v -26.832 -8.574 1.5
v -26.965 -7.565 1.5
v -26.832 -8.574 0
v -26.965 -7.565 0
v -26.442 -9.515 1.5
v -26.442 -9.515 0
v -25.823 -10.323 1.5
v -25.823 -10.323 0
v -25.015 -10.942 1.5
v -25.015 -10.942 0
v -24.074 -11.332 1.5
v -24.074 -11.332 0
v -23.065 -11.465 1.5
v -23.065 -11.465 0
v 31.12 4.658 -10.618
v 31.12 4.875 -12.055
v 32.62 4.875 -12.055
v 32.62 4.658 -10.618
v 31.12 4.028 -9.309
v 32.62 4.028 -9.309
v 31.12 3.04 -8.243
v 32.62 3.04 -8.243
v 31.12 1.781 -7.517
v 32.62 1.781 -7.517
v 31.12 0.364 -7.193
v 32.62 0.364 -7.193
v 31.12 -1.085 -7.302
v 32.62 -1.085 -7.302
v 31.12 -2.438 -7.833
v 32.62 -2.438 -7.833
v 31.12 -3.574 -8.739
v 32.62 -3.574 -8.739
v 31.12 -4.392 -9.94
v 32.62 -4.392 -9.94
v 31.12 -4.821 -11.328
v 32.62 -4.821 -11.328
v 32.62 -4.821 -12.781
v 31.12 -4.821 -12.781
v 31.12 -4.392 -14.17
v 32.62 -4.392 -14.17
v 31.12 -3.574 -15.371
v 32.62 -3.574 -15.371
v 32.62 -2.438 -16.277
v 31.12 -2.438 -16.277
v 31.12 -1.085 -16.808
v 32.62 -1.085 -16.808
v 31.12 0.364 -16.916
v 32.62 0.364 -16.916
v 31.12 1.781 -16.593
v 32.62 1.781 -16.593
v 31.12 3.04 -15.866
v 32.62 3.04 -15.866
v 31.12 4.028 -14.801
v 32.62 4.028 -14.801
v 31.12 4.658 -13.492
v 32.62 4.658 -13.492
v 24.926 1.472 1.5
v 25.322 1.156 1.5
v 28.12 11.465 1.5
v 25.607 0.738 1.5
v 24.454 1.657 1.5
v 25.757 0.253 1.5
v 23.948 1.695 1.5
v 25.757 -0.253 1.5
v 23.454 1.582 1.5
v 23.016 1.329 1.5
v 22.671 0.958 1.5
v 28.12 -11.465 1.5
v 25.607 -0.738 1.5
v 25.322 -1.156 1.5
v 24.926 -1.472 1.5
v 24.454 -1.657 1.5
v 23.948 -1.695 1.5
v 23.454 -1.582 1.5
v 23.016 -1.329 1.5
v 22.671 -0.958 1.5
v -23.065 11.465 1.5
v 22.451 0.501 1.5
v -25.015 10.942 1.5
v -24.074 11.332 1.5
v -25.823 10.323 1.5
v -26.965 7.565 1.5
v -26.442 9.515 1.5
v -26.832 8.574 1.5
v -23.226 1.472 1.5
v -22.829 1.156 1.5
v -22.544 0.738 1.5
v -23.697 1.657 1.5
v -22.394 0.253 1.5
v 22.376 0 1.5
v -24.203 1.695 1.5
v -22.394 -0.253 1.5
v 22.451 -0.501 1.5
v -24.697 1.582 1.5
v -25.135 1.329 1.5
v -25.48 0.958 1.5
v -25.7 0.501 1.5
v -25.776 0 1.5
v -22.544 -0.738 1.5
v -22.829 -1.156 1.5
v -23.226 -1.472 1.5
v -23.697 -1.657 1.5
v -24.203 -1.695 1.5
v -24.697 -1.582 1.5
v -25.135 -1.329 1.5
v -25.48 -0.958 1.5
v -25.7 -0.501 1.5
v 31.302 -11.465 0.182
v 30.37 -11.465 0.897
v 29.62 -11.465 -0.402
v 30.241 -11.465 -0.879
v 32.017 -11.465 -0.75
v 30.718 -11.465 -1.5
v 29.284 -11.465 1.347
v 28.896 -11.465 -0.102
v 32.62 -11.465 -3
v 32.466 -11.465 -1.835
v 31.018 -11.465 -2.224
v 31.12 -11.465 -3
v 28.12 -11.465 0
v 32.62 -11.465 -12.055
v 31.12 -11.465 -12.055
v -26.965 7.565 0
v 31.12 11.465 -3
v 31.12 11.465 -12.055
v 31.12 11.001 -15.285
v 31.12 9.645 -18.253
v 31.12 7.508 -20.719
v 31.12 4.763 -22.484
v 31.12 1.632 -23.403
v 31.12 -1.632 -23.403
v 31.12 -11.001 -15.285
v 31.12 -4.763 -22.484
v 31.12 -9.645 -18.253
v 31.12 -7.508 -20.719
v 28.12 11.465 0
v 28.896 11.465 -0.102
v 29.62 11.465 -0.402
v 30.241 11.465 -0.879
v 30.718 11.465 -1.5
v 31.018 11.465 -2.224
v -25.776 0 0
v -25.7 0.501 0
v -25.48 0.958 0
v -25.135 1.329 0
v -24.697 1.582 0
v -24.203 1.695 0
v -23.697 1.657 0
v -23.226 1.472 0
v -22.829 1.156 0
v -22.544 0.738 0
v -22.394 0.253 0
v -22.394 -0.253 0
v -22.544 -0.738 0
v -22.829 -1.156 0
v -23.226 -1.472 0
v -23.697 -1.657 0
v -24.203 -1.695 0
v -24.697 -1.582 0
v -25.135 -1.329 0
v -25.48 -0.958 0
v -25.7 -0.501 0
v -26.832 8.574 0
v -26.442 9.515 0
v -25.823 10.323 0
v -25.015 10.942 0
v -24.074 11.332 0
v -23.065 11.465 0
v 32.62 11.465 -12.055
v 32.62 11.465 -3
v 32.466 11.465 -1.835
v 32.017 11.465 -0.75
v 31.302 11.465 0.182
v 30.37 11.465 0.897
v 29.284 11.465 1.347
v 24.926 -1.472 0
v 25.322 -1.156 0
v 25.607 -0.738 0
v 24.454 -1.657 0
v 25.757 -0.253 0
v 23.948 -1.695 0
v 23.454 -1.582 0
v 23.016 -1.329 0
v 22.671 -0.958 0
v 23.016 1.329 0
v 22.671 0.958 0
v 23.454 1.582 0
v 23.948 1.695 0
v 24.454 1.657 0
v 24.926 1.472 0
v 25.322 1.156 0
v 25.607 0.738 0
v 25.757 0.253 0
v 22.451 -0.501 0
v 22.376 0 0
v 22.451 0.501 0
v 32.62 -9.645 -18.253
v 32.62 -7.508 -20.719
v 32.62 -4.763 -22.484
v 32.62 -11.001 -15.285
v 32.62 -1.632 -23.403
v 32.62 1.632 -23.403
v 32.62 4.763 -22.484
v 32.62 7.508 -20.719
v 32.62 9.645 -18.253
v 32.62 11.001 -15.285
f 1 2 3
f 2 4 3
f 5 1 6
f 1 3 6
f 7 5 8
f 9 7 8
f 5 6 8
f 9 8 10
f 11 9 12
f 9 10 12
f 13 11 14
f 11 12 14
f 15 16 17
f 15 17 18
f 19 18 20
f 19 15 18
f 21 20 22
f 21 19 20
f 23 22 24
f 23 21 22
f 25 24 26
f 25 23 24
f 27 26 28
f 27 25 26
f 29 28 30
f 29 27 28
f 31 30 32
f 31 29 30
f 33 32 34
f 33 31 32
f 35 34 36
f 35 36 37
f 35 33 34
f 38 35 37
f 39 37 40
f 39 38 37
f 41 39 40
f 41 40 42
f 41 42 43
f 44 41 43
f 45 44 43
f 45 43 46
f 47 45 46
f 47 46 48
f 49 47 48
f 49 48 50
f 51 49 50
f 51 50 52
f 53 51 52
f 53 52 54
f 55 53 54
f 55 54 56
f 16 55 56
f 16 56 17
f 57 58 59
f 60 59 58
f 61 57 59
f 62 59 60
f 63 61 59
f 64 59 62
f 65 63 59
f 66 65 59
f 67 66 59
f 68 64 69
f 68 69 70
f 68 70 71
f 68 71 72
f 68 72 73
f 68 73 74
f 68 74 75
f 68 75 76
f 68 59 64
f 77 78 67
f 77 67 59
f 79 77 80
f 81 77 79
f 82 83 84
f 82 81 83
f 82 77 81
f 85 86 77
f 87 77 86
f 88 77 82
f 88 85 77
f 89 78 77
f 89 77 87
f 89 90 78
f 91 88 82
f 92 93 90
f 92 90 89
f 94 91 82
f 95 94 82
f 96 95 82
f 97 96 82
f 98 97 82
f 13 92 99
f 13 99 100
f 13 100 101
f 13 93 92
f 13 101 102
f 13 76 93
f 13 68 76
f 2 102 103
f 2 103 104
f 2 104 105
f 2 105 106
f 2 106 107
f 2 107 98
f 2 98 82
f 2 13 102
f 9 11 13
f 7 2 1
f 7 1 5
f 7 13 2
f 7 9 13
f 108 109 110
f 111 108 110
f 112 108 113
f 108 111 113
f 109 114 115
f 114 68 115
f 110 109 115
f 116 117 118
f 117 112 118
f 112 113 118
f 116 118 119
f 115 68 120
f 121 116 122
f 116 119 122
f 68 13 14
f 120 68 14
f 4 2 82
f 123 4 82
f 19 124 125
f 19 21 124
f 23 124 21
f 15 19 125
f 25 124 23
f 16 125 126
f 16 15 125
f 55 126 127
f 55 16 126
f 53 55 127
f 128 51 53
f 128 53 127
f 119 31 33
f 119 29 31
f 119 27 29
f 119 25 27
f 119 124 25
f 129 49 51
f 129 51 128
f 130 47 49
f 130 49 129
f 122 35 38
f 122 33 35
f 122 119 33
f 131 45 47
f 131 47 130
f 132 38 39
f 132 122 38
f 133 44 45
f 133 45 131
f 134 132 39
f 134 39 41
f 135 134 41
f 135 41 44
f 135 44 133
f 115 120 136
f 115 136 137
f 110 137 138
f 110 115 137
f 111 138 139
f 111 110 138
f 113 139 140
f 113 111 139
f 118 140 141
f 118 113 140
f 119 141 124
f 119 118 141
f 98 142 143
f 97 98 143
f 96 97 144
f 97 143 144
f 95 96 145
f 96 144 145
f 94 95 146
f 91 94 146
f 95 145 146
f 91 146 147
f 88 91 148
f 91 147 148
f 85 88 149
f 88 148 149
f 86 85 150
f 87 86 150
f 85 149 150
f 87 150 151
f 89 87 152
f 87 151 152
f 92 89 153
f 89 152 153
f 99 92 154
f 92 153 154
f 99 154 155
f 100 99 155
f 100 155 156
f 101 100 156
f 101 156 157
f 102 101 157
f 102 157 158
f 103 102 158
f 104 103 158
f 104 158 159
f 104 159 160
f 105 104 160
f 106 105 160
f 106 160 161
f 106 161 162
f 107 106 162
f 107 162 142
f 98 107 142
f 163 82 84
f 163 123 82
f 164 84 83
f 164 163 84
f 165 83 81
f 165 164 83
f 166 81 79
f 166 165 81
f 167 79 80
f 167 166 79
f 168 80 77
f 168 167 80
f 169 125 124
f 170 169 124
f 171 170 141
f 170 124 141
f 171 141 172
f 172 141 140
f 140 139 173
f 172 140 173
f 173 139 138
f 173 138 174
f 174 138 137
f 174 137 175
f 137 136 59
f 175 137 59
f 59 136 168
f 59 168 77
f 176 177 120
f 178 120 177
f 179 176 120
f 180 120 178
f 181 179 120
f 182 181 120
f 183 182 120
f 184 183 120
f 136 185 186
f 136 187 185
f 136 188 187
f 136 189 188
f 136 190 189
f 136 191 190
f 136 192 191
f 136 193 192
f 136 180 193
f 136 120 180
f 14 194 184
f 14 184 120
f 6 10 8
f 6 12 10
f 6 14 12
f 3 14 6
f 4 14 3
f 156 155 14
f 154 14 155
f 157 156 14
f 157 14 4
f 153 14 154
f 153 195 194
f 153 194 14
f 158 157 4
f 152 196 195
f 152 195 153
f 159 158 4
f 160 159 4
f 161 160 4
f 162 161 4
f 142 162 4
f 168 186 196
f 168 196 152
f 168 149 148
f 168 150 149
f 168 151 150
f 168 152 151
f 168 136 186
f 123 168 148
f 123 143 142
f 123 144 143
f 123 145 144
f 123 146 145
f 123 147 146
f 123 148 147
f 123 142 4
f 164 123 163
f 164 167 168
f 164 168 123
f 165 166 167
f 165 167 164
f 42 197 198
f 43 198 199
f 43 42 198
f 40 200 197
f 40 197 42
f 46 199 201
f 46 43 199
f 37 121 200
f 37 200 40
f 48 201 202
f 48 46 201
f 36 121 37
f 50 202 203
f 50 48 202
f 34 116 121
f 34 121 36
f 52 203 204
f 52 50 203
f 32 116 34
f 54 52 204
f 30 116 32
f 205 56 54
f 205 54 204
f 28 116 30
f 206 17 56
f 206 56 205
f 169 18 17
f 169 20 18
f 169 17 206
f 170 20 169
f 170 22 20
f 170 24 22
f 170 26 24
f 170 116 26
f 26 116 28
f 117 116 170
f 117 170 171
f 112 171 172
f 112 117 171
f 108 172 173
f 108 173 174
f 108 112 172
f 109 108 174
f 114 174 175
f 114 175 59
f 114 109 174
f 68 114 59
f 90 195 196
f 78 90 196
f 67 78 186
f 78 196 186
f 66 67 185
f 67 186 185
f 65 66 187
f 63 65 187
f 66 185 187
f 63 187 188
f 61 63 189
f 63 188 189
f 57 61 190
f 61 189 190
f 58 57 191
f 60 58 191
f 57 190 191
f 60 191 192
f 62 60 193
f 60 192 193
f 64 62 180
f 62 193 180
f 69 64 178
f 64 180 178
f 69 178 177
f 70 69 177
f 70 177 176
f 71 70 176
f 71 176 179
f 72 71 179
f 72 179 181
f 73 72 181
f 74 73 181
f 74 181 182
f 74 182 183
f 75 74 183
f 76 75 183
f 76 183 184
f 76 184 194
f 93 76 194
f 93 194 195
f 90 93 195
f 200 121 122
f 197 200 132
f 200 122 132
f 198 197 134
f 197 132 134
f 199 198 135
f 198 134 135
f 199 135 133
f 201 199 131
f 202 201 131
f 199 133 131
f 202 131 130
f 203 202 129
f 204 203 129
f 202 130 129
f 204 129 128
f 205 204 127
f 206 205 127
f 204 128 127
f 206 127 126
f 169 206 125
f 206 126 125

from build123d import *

# Parameters (mm, degrees)
SKETCH1_W                  = 53.93
SKETCH1_H                  = 22.93
BOSS_EXTRUDE1_DEPTH        = 1.5
M3_CLEARANCE_HOLE1_D       = 3.4
M3_CLEARANCE_HOLE1_DEPTH   = 27
M3_CLEARANCE_HOLE1_TIP     = 1.021463052
FILLET1_R                  = 3.9
BOSS_EXTRUDE2_START        = -1.5
SKETCH4_R                  = 4.875
BOSS_EXTRUDE2_DEPTH        = 1.5
SKETCHED_START             = 32.144466887
SKETCHED_BEND1_OUTLINE_W   = 22.93
SKETCHED_BEND1_OUTLINE_H   = 1.5
SKETCHED_BEND1_DEPTH       = 23.855533113
SKETCHED_START_2           = 28.119756887
SKETCHED_BEND1_2_OUTLINE_R = 4.875
SKETCHED_BEND1_2_DEPTH     = 4.5
SKETCHED_START_3           = -11.465
SKETCHED_BEND1_3_DEPTH     = 22.93


with BuildPart() as part:
    # Sketch1 → Boss-Extrude1 (new body)
    with BuildSketch(Plane.XY.offset(1.5)):
        Rectangle(SKETCH1_W, SKETCH1_H)
    extrude(amount=-BOSS_EXTRUDE1_DEPTH)

    # M3 Clearance Hole1
    with Locations(Plane.XY.offset(1.5)):
        with Locations((-24.0755, 0), (24.0755, 0)):
            Hole(M3_CLEARANCE_HOLE1_D / 2, depth=M3_CLEARANCE_HOLE1_DEPTH)
            with Locations((0, 0, -(M3_CLEARANCE_HOLE1_DEPTH + M3_CLEARANCE_HOLE1_TIP / 2))):  # 118° drill point
                Cone(0, M3_CLEARANCE_HOLE1_D / 2, M3_CLEARANCE_HOLE1_TIP, mode=Mode.SUBTRACT)

    # Fillet1
    fillet1_edges = [part.edges().sort_by_distance(p)[0] for p in [
        (-26.965, -11.465, 0.75),
        (-26.965, 11.465, 0.75),
        (26.965, 11.465, 0.75),
        (26.965, -11.465, 0.75),
    ]]
    fillet(fillet1_edges, radius=FILLET1_R)

    # Sketch4 → Boss-Extrude2 (add)
    with BuildSketch(Plane.XY.offset(1.5).offset(BOSS_EXTRUDE2_START)):
        with BuildLine():
            Line((23.065, 11.465), (43.065, 11.465))
            ThreePointArc((43.065, 11.465), (54.53, 0), (43.065, -11.465))
            Line((43.065, -11.465), (23.065, -11.465))
            ThreePointArc((23.065, -11.465), (25.822716447, -10.322716447), (26.965, -7.565))
            Line((26.965, -7.565), (26.965, 7.565))
            ThreePointArc((26.965, 7.565), (25.822716447, 10.322716447), (23.065, 11.465))
        make_face()
        with Locations((43.065, 0)):
            Circle(SKETCH4_R, mode=Mode.SUBTRACT)
    extrude(amount=BOSS_EXTRUDE2_DEPTH)

    # Sketched Bend1: read off the stored shape, not the designer's step
    # Sketched Bend1 outline → Sketched Bend1 (cut)
    with BuildSketch(Plane.YZ.offset(SKETCHED_START)):
        with Locations((0, 0.75)):
            Rectangle(SKETCHED_BEND1_OUTLINE_W, SKETCHED_BEND1_OUTLINE_H)
    extrude(amount=SKETCHED_BEND1_DEPTH, mode=Mode.SUBTRACT)

    # Sketched Bend1 2 outline → Sketched Bend1 2 (add)
    with BuildSketch(Plane.YZ.offset(SKETCHED_START_2)):
        with BuildLine():
            Line((-11.465, 0), (-11.465, -12.054756887))
            ThreePointArc((-11.465, -12.054756887), (0, -23.519756887), (11.465, -12.054756887))
            Line((11.465, -12.054756887), (11.465, 0))
            Line((11.465, 0), (-11.465, 0))
        make_face()
        with Locations((0, -12.054756887)):
            Circle(SKETCHED_BEND1_2_OUTLINE_R, mode=Mode.SUBTRACT)
    extrude(amount=SKETCHED_BEND1_2_DEPTH)

    # Sketched Bend1 3 outline → Sketched Bend1 3 (cut)
    with BuildSketch(Plane(origin=(0, 0, 0), x_dir=(1, 0, 0), z_dir=(0, 1, 0)).offset(SKETCHED_START_3)):
        with BuildLine():
            ThreePointArc((28.119756887, 0), (30.241077231, 0.878679656), (31.119756887, 3))
            Line((31.119756887, 3), (31.119756887, 25))
            Line((31.119756887, 25), (28.119756887, 25))
            Line((28.119756887, 25), (28.119756887, 0))
        make_face()
        with BuildLine():
            Line((32.619756887, 0), (32.619756887, 3))
            ThreePointArc((32.619756887, 3), (31.301737402, -0.181980515), (28.119756887, -1.5))
            Line((28.119756887, -1.5), (27, -1.5))
            Line((27, -1.5), (27, -3))
            Line((27, -3), (32.144466887, -3))
            Line((32.144466887, -3), (32.144466887, 0))
            Line((32.144466887, 0), (32.619756887, 0))
        make_face()
    extrude(amount=SKETCHED_BEND1_3_DEPTH, mode=Mode.SUBTRACT)


solid = part.part
